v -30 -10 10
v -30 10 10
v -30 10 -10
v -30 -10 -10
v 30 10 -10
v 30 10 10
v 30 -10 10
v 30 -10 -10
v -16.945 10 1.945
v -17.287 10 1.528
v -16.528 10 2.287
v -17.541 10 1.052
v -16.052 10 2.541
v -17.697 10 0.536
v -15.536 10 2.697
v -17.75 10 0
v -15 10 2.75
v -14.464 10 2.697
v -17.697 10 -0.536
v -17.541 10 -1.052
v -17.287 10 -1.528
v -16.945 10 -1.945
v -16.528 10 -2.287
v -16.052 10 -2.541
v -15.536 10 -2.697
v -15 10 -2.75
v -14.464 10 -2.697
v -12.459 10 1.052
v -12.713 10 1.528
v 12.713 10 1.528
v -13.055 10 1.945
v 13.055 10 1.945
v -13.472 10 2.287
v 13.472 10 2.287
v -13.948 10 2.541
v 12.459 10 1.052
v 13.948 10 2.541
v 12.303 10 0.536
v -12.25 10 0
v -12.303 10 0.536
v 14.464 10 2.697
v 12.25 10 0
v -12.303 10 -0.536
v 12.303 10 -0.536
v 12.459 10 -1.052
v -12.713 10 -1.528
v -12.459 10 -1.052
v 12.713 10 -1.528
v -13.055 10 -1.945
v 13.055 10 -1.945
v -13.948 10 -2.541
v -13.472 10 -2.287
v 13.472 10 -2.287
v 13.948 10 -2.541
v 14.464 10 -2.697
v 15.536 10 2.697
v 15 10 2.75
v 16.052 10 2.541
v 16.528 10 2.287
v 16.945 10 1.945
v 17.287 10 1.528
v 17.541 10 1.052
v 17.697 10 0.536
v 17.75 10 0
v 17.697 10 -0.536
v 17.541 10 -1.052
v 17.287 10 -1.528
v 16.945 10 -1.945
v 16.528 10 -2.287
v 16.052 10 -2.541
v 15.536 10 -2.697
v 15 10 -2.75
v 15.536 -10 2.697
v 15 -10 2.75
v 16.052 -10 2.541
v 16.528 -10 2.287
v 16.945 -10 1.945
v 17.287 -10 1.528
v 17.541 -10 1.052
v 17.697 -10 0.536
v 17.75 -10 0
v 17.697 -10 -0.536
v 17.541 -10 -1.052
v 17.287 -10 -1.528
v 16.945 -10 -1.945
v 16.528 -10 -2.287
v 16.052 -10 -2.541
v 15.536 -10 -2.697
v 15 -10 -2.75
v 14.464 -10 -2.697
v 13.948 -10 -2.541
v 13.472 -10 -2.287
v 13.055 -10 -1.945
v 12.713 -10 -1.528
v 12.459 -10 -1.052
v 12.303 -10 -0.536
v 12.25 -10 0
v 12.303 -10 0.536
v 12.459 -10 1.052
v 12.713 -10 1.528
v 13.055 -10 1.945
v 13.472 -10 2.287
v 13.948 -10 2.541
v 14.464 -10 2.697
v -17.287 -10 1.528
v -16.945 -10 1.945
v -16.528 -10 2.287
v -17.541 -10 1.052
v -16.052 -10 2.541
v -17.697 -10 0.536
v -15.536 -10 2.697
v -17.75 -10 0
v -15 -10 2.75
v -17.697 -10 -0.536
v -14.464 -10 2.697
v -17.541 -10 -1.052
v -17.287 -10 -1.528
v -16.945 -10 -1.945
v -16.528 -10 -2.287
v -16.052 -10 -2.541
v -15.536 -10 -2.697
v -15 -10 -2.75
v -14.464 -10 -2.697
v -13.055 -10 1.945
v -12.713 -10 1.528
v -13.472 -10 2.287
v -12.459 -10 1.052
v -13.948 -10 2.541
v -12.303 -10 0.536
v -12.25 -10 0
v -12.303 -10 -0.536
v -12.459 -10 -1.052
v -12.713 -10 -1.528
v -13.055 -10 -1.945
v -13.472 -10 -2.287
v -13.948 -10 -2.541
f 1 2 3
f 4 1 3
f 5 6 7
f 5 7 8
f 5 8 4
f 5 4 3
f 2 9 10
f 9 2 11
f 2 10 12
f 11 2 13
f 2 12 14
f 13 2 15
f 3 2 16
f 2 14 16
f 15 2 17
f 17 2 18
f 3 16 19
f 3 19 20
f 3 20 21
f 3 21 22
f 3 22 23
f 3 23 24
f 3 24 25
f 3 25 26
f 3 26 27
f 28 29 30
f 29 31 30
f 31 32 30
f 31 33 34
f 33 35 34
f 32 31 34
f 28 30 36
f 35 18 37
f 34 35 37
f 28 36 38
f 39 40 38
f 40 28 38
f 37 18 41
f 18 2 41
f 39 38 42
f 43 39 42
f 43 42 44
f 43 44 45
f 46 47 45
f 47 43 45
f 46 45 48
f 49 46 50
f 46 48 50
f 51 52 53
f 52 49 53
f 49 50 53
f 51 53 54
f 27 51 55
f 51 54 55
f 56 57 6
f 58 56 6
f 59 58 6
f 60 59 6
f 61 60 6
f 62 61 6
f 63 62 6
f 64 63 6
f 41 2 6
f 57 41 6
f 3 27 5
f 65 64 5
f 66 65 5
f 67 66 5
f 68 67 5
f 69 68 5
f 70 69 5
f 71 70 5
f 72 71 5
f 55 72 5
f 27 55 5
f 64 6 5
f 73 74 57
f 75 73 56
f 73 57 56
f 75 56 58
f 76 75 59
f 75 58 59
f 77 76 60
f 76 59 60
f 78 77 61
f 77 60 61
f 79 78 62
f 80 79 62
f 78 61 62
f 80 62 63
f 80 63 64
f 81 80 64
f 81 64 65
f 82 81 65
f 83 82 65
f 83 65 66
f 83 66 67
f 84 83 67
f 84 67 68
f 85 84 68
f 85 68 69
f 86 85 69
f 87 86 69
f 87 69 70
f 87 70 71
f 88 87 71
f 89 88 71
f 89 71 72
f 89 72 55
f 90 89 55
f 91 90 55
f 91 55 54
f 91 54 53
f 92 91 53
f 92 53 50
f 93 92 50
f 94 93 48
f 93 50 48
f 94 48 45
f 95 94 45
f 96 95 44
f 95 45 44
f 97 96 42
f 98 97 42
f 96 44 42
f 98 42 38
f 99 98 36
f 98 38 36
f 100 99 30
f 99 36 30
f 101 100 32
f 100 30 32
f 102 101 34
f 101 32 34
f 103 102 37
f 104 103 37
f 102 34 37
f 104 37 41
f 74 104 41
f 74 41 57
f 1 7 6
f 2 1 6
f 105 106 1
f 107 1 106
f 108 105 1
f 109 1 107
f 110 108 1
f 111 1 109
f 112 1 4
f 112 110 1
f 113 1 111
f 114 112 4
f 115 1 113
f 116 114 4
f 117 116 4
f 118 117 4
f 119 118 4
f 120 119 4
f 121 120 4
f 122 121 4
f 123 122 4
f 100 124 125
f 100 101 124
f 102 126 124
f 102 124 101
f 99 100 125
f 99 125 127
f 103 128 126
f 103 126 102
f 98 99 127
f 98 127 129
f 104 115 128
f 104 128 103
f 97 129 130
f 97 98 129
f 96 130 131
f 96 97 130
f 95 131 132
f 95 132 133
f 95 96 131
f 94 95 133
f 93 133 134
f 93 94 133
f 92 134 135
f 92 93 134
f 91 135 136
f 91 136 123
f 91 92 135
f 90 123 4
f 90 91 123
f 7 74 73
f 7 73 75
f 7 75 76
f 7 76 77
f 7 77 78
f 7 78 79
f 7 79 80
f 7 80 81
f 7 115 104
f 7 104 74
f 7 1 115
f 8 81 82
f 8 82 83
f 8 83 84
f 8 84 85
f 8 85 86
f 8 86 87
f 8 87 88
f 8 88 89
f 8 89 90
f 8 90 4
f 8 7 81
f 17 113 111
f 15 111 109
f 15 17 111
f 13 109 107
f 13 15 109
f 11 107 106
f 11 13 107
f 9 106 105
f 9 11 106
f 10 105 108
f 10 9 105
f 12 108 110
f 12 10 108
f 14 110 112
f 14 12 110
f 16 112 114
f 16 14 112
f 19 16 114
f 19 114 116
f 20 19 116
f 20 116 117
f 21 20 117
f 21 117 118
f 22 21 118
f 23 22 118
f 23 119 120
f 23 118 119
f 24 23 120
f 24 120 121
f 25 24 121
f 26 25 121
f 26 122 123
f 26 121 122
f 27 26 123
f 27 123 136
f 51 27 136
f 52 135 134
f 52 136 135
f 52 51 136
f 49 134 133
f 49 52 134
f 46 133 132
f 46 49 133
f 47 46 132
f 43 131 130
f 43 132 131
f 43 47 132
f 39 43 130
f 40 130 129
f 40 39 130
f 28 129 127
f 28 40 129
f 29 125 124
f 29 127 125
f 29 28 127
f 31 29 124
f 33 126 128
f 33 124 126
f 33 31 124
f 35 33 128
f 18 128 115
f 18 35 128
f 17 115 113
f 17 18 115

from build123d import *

# Parameters (mm, degrees)
SKETCH1_W           = 20
SKETCH1_H           = 20
BOSS_EXTRUDE1_DEPTH = 30
SKETCH2_R           = 2.75
CUT_EXTRUDE1_DEPTH  = 38.416573868


with BuildPart() as part:
    # Sketch1 → Boss-Extrude1 (new, symmetric)
    with BuildSketch(Plane(origin=(0, 0, 0), x_dir=(0, 0, -1), z_dir=(1, 0, 0))):
        Rectangle(SKETCH1_W, SKETCH1_H)
    extrude(amount=BOSS_EXTRUDE1_DEPTH, both=True)

    # Sketch2 → Cut-Extrude1 (cut, through all)
    with BuildSketch(Plane(origin=(0, 10, 0), x_dir=(1, 0, 0), z_dir=(0, 1, 0))):
        with Locations(Location((15, 0, 0), (0, 0, 270))):
            Circle(SKETCH2_R)
    cut_extrude1 = extrude(amount=-CUT_EXTRUDE1_DEPTH, mode=Mode.SUBTRACT)

    # Mirror1: Cut-Extrude1 across plane
    add(cut_extrude1.mirror(Plane(origin=(0, 0, 0), x_dir=(0, 0, 1), z_dir=(1, 0, 0))), mode=Mode.SUBTRACT)


solid = part.part
